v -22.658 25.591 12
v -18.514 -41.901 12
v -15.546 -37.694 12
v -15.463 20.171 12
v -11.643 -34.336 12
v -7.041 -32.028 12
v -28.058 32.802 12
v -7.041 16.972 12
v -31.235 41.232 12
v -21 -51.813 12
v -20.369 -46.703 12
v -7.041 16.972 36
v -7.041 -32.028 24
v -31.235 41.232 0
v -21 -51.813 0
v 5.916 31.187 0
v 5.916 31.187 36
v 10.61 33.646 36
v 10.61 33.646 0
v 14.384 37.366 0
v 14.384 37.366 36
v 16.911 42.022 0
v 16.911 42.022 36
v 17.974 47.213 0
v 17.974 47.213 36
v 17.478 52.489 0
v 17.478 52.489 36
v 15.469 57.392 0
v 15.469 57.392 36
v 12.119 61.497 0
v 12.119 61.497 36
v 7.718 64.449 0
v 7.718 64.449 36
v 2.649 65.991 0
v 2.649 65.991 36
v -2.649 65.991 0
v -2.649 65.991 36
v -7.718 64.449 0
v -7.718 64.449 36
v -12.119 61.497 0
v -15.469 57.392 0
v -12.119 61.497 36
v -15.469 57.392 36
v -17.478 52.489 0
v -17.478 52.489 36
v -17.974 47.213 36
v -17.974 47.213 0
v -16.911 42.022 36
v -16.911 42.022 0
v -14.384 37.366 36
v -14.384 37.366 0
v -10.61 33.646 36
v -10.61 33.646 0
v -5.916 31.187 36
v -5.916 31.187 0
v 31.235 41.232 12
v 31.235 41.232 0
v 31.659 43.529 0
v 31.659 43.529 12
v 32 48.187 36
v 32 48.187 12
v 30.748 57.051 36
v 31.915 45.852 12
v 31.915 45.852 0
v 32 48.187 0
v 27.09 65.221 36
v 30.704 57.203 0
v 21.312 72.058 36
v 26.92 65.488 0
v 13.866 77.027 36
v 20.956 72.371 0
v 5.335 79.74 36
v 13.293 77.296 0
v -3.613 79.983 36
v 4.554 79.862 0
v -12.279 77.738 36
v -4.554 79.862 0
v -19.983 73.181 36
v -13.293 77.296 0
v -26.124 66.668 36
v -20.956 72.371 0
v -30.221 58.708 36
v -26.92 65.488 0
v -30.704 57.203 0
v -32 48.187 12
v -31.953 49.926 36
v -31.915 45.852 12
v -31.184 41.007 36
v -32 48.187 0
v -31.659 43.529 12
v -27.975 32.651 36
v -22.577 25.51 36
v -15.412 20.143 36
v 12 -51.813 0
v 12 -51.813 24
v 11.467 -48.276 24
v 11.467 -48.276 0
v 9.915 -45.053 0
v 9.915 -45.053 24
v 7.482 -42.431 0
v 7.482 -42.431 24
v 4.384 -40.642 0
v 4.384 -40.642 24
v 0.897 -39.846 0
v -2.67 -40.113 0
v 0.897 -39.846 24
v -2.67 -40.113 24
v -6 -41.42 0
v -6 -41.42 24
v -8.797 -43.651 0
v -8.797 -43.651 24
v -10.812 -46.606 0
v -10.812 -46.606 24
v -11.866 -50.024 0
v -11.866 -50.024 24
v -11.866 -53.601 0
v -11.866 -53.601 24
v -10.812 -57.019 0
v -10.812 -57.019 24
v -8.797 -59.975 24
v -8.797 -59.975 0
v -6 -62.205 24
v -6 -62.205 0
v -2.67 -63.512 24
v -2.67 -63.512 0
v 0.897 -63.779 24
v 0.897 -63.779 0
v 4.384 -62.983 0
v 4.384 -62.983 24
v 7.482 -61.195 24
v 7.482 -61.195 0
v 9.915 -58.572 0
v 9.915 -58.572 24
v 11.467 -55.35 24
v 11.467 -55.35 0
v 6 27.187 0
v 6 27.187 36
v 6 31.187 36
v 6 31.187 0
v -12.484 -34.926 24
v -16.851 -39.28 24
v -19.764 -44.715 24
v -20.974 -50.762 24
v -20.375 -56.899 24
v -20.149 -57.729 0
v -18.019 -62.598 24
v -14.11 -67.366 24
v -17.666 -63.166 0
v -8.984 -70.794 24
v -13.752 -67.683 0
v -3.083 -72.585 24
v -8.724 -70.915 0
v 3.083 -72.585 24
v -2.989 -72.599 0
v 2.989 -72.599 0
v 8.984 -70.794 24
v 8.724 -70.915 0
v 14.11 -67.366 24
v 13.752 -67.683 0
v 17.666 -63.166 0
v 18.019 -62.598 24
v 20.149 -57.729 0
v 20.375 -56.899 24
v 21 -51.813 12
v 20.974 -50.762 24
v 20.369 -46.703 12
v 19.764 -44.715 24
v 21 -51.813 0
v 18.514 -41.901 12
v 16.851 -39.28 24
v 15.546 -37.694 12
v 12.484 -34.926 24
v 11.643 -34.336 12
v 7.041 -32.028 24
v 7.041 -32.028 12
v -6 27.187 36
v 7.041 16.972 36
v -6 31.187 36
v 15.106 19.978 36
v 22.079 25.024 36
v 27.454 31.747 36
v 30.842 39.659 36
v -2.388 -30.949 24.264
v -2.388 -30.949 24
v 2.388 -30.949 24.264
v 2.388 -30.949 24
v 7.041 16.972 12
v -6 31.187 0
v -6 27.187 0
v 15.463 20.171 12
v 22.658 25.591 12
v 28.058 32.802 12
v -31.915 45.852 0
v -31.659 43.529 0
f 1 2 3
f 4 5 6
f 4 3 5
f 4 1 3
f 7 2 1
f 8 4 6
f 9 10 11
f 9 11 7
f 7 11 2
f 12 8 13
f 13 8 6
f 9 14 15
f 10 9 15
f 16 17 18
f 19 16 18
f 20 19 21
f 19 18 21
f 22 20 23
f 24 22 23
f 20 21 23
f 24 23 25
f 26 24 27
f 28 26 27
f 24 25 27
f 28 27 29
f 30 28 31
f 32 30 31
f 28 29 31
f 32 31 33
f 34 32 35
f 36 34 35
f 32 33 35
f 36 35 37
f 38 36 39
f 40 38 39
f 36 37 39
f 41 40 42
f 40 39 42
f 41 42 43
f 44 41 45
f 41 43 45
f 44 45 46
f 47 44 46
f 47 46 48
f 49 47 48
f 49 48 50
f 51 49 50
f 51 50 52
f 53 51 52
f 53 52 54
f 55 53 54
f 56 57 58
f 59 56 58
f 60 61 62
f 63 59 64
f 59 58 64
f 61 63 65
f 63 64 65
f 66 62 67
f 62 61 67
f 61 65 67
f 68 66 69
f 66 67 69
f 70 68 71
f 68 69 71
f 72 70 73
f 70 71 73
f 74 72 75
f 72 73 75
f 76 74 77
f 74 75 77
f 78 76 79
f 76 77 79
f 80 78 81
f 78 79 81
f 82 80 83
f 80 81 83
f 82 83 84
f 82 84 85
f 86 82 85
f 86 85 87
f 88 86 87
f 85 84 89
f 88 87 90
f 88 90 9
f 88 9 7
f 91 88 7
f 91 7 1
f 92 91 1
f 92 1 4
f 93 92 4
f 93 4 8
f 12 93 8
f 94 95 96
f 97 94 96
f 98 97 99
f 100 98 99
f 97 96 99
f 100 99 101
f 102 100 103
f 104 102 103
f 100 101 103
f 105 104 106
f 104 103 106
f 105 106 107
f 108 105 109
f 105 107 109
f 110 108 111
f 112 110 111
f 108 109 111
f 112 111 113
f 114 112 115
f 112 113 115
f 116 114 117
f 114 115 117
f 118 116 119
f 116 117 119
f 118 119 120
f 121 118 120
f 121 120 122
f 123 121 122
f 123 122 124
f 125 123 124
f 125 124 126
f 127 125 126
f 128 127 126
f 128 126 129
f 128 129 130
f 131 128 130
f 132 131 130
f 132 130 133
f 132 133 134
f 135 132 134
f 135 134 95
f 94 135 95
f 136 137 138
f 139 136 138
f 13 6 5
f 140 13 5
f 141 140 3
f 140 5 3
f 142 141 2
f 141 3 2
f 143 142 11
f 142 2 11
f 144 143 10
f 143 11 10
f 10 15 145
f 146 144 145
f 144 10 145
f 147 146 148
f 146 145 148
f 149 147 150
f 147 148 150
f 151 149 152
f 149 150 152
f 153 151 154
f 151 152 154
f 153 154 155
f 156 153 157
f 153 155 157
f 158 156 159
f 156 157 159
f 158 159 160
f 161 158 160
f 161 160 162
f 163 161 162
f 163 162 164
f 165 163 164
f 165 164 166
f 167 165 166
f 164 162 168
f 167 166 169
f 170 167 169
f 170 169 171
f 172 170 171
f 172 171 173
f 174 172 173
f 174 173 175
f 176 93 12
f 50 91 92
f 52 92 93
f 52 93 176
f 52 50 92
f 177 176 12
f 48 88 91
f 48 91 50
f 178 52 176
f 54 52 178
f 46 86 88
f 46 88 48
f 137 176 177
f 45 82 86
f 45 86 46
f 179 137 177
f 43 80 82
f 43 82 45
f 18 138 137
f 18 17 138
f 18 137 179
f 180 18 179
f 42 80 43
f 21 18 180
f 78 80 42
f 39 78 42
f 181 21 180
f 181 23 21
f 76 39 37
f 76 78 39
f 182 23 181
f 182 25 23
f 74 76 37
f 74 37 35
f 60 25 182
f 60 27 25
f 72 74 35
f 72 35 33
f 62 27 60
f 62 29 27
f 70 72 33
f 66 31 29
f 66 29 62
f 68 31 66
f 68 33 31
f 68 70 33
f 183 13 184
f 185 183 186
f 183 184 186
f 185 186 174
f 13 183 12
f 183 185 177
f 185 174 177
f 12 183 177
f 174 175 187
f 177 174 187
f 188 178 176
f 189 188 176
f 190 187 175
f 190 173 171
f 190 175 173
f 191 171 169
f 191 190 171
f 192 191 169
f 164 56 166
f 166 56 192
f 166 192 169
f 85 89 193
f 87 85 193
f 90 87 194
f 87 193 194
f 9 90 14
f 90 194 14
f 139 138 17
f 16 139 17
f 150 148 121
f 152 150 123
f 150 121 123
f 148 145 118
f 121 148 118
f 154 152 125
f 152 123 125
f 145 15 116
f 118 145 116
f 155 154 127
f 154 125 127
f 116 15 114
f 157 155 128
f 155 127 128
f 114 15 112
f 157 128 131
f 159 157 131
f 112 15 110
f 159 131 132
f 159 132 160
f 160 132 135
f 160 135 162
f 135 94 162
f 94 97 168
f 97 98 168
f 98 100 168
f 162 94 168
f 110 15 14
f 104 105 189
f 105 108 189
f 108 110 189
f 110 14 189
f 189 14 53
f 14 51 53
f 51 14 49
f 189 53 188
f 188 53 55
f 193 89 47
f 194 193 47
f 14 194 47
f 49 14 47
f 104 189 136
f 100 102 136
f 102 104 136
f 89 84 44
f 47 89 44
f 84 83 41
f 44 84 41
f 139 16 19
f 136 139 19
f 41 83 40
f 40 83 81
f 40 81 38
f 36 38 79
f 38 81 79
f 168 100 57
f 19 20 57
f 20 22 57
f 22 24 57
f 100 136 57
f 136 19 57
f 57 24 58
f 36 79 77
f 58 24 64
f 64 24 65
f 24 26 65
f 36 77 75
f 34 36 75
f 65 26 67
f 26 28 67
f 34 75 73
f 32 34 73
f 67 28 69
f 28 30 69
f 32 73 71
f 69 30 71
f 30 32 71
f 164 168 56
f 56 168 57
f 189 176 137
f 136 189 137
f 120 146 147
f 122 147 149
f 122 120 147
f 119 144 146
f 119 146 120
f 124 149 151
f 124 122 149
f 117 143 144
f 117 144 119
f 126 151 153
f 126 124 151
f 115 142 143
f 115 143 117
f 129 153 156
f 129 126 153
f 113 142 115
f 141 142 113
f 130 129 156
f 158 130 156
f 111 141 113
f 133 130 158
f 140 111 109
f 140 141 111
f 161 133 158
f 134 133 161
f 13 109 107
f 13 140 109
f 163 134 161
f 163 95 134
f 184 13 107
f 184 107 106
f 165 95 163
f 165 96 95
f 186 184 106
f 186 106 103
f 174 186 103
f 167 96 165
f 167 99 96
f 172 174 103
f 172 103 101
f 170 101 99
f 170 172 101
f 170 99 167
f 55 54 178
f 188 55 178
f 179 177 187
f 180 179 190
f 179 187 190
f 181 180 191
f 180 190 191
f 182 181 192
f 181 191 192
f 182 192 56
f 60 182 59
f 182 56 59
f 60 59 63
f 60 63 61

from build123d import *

# Parameters (mm, degrees)
F0_R      = 9.477436644
F1_DEPTH  = 12
F2_R      = 32
F3_DEPTH  = 24
F4_R      = 21
F5_DEPTH  = 12
F7_DEPTH  = 36.001
F8_R      = 12
F9_DEPTH  = 24.001
F11_DEPTH = 24
F13_DEPTH = 25


with BuildPart() as f1:
    # F0 (on Top) → F1 (new body)
    with BuildSketch(Plane.XY):
        with BuildLine():
            ThreePointArc((-31.2348582156, 41.2315710582), (0, 16.187405462), (31.2348582156, 41.2315710582))
            Line((31.2348582156, 41.2315710582), (32, 48.187405462))
            ThreePointArc((32, 48.187405462), (0, 80.187405462), (-32, 48.187405462))
            Line((-32, 48.187405462), (-31.2348582156, 41.2315710582))
        make_face()
        with BuildLine():
            ThreePointArc((-6, 31.2168427135), (-10.3923048454, 62.8843439187), (18, 48.187405462))
            ThreePointArc((18, 48.187405462), (14.6969384567, 37.7951006165), (6, 31.2168427135))
            Line((6, 31.2168427135), (6, 28.187405462))
            Line((6, 28.187405462), (-6, 28.187405462))
            Line((-6, 28.187405462), (-6, 31.2168427135))
        make_face(mode=Mode.SUBTRACT)
        with BuildLine():
            ThreePointArc((-21, -51.812594538), (0, -30.812594538), (21, -51.812594538))
            Line((21, -51.812594538), (31.2348582156, 41.2315710582))
            ThreePointArc((31.2348582156, 41.2315710582), (0, 16.187405462), (-31.2348582156, 41.2315710582))
            Line((-31.2348582156, 41.2315710582), (-21, -51.812594538))
        make_face()
        with BuildLine():
            ThreePointArc((-21, -51.812594538), (0, -72.812594538), (21, -51.812594538))
            ThreePointArc((21, -51.812594538), (0, -30.812594538), (-21, -51.812594538))
        make_face()
        with Locations((0, -51.812594538)):
            Circle(F0_R, mode=Mode.SUBTRACT)
        with BuildLine():
            ThreePointArc((6, 31.2168427135), (14.6969384567, 37.7951006165), (18, 48.187405462))
            ThreePointArc((18, 48.187405462), (-10.3923048454, 62.8843439187), (-6, 31.2168427135))
            ThreePointArc((-6, 31.2168427135), (0, 30.187405462), (6, 31.2168427135))
        make_face()
        with Locations((0, -51.812594538)):
            Circle(F0_R)
        with BuildLine():
            ThreePointArc((6, 31.2168427135), (0, 30.187405462), (-6, 31.2168427135))
            Line((-6, 31.2168427135), (-6, 28.187405462))
            Line((-6, 28.187405462), (6, 28.187405462))
            Line((6, 28.187405462), (6, 31.2168427135))
        make_face()
        with BuildLine():
            ThreePointArc((-32, 48.187405462), (-31.8081393899, 44.6885101291), (-31.2348582156, 41.2315710582))
            Line((-31.2348582156, 41.2315710582), (-32, 48.187405462))
        make_face()
        with BuildLine():
            Line((32, 48.187405462), (31.2348582156, 41.2315710582))
            ThreePointArc((31.2348582156, 41.2315710582), (31.8081393899, 44.6885101291), (32, 48.187405462))
        make_face()
    extrude(amount=F1_DEPTH)

    # F2 (on face) → F3 (join)
    with BuildSketch(Plane.XY.offset(12)):
        with Locations((0, 48.187405462)):
            Circle(F2_R)
    extrude(amount=F3_DEPTH)

    # F4 (on face) → F5 (join)
    with BuildSketch(Plane.XY.offset(12)):
        with Locations((0, -51.812594538)):
            Circle(F4_R)
    extrude(amount=F5_DEPTH)

    # F6 (on face) → F7 (cut, through all)
    with BuildSketch(Plane.XY.offset(36)):
        with BuildLine():
            Line((6, 31.187405462), (5.9160797831, 31.187405462))
            ThreePointArc((5.9160797831, 31.187405462), (0, 66.187405462), (-5.9160797831, 31.187405462))
            Line((-5.9160797831, 31.187405462), (-6, 31.187405462))
            Line((-6, 31.187405462), (-6, 27.187405462))
            Line((-6, 27.187405462), (6, 27.187405462))
            Line((6, 27.187405462), (6, 31.187405462))
        make_face()
    extrude(amount=-F7_DEPTH, mode=Mode.SUBTRACT)

    # F8 (on face) → F9 (cut, through all)
    with BuildSketch(Plane.XY.offset(24)):
        with Locations((0, -51.812594538)):
            Circle(F8_R)
    extrude(amount=-F9_DEPTH, mode=Mode.SUBTRACT)

    # F10 (on face) → F11 (join)
    with BuildSketch(Plane.XY.offset(12)):
        with BuildLine():
            ThreePointArc((-7.0413727647, -32.0282808126), (0, -30.812594538), (7.0413727647, -32.0282808126))
            Line((7.0413727647, -32.0282808126), (7.0413727647, 16.9717191874))
            ThreePointArc((7.0413727647, 16.9717191874), (0, 16.187405462), (-7.0413727647, 16.9717191874))
            Line((-7.0413727647, 16.9717191874), (-7.0413727647, -32.0282808126))
        make_face()
    extrude(amount=F11_DEPTH)

    # F12 (on face) → F13 (cut)
    with BuildSketch(Plane.YZ.offset(7.0413727647)):
        Polygon((-32.0282808126, 36), (-32.0282808126, 24), (16.9717191874, 36), align=None)
    extrude(amount=-F13_DEPTH, mode=Mode.SUBTRACT)


solid = f1.part
